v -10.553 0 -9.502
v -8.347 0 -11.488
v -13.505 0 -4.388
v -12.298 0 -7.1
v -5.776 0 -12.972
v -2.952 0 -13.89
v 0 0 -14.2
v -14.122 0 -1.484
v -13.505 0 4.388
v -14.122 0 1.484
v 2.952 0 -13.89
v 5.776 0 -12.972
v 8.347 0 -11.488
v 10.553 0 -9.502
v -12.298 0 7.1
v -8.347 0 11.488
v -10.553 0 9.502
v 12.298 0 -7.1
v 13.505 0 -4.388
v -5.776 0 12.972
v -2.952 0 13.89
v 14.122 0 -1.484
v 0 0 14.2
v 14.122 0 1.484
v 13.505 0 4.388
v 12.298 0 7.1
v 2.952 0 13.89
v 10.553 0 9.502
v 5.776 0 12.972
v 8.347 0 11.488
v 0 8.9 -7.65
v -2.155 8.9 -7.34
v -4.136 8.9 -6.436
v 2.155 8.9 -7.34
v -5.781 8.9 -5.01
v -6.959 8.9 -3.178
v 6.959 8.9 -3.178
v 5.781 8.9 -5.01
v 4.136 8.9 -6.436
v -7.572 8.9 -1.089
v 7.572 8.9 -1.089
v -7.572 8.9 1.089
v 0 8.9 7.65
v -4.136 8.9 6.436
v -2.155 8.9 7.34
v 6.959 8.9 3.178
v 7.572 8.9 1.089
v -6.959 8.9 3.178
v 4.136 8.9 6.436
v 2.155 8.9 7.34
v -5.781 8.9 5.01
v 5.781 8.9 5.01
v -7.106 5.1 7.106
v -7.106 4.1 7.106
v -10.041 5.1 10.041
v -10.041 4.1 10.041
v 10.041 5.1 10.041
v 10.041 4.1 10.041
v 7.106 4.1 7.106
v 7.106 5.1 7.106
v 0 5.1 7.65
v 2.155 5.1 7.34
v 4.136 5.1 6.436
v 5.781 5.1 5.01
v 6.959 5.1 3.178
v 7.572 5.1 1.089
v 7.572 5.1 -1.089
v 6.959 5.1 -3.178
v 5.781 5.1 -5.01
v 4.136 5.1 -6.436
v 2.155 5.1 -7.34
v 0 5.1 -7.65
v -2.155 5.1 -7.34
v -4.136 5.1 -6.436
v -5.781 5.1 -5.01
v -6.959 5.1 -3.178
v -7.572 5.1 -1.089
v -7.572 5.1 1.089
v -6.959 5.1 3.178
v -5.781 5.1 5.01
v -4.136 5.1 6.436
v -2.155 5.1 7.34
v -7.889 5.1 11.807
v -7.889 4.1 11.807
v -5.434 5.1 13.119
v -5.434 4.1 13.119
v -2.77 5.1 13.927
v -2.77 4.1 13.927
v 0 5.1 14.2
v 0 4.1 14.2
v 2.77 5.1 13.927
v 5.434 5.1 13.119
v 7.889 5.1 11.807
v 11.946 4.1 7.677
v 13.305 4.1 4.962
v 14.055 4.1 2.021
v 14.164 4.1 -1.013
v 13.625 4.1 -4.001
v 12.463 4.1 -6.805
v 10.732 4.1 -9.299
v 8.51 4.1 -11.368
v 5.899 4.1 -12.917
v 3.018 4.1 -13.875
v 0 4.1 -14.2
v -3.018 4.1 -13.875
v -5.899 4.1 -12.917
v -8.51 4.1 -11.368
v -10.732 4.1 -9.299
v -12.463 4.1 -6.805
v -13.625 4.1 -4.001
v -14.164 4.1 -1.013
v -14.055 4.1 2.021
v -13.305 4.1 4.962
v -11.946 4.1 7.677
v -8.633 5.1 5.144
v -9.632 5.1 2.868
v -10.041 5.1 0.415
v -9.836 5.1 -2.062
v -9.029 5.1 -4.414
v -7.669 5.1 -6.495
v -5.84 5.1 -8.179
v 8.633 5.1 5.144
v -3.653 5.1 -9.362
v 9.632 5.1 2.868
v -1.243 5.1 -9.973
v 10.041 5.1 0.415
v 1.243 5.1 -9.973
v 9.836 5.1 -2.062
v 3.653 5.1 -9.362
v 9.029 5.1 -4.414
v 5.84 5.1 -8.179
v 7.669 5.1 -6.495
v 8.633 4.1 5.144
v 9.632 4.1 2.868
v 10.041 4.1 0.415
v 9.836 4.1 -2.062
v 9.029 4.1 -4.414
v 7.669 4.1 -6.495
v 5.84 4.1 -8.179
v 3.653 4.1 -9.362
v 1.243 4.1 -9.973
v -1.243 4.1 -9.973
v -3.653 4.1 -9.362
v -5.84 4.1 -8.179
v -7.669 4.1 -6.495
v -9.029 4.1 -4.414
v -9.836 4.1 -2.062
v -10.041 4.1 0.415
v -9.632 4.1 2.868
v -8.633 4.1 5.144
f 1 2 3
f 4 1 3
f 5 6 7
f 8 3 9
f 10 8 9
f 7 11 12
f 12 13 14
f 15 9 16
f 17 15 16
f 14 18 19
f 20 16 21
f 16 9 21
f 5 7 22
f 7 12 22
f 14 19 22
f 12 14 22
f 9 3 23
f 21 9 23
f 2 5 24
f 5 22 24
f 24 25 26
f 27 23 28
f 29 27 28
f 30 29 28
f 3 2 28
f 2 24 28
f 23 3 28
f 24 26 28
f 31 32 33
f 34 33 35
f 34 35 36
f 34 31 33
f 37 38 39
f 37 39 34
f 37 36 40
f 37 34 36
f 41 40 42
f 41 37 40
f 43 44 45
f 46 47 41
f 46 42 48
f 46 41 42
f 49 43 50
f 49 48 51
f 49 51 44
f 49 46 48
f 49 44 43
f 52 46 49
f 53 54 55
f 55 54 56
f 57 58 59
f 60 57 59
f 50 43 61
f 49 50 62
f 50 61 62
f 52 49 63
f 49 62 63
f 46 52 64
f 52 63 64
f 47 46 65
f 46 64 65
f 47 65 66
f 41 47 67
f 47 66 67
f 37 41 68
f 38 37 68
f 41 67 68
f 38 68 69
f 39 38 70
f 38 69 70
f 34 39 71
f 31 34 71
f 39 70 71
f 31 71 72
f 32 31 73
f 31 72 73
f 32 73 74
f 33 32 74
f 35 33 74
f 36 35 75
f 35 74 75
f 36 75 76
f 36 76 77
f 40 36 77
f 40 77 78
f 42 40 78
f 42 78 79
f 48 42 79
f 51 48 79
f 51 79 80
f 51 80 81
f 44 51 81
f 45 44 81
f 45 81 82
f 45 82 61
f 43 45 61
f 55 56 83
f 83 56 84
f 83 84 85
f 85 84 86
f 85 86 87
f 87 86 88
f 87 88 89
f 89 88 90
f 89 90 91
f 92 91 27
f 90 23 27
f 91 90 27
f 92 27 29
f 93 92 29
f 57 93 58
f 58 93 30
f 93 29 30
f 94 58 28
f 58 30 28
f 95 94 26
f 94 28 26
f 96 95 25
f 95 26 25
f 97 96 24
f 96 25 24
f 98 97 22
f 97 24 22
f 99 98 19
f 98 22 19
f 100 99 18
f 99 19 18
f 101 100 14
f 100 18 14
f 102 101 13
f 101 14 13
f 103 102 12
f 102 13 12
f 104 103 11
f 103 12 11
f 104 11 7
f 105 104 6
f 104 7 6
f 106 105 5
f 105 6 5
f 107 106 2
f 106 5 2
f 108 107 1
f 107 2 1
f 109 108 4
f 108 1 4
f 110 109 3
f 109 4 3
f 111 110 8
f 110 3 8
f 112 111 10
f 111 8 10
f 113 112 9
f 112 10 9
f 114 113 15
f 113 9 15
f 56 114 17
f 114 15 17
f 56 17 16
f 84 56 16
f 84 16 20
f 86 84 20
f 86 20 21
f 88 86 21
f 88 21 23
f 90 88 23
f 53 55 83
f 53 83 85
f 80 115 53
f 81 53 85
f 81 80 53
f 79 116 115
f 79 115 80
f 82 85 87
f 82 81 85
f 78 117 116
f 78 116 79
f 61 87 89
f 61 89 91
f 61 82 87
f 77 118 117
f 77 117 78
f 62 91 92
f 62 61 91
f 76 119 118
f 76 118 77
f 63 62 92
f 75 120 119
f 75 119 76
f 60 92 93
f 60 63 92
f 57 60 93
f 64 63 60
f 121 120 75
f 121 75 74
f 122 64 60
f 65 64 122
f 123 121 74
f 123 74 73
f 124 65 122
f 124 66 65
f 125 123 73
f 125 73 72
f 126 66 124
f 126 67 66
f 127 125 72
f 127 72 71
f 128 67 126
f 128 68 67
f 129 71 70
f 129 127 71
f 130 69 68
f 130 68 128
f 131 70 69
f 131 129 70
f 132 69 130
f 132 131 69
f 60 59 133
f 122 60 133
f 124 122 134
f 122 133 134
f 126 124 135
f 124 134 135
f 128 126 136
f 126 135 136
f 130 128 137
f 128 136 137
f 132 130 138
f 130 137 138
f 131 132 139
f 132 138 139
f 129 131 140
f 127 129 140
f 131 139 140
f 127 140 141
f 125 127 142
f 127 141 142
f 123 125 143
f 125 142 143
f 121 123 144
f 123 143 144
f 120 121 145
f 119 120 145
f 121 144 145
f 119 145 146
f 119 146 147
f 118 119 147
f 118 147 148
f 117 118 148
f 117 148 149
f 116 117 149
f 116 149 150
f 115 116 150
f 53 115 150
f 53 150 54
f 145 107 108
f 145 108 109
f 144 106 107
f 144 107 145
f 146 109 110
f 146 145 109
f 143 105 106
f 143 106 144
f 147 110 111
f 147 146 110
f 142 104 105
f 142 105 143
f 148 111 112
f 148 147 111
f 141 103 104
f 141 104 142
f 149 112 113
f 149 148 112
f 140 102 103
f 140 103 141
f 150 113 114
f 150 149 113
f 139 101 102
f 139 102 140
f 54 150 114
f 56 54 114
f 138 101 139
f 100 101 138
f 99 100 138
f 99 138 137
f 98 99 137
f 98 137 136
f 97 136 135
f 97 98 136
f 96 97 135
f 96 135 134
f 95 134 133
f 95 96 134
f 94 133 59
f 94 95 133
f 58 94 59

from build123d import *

# Parameters (mm, degrees)
SKETCH_1_R      = 14.2
EXTRUDE_1_DEPTH = 4.1
EXTRUDE_2_DEPTH = 1
SKETCH_2_4_R    = 7.65
EXTRUDE_3_DEPTH = 4.8


with BuildPart() as part:
    # 草图1 → 凸台-拉伸1 (new body)
    with BuildSketch(Plane(origin=(0, 0, 0), x_dir=(1, 0, 0), z_dir=(0, 1, 0))):
        Circle(SKETCH_1_R)
    extrude(amount=EXTRUDE_1_DEPTH)

    # 草图2 → 凸台-拉伸2 (add)
    with BuildSketch(Plane(origin=(0, 4.1, 0), x_dir=(1, 0, 0), z_dir=(0, 1, 0))):
        with BuildLine():
            ThreePointArc((7.106423151, -7.106423151), (0, 10.05), (-7.106423151, -7.106423151))
            Line((-7.106423151, -7.106423151), (-10.040916293, -10.040916293))
            ThreePointArc((-10.040916293, -10.040916293), (0, -14.2), (10.040916293, -10.040916293))
            Line((10.040916293, -10.040916293), (7.106423151, -7.106423151))
        make_face()
    extrude(amount=EXTRUDE_2_DEPTH)

    # 草图2<4> → 凸台-拉伸3 (add)
    with BuildSketch(Plane(origin=(0, 4.1, 0), x_dir=(1, 0, 0), z_dir=(0, 1, 0))):
        Circle(SKETCH_2_4_R)
    extrude(amount=EXTRUDE_3_DEPTH)


solid = part.part
